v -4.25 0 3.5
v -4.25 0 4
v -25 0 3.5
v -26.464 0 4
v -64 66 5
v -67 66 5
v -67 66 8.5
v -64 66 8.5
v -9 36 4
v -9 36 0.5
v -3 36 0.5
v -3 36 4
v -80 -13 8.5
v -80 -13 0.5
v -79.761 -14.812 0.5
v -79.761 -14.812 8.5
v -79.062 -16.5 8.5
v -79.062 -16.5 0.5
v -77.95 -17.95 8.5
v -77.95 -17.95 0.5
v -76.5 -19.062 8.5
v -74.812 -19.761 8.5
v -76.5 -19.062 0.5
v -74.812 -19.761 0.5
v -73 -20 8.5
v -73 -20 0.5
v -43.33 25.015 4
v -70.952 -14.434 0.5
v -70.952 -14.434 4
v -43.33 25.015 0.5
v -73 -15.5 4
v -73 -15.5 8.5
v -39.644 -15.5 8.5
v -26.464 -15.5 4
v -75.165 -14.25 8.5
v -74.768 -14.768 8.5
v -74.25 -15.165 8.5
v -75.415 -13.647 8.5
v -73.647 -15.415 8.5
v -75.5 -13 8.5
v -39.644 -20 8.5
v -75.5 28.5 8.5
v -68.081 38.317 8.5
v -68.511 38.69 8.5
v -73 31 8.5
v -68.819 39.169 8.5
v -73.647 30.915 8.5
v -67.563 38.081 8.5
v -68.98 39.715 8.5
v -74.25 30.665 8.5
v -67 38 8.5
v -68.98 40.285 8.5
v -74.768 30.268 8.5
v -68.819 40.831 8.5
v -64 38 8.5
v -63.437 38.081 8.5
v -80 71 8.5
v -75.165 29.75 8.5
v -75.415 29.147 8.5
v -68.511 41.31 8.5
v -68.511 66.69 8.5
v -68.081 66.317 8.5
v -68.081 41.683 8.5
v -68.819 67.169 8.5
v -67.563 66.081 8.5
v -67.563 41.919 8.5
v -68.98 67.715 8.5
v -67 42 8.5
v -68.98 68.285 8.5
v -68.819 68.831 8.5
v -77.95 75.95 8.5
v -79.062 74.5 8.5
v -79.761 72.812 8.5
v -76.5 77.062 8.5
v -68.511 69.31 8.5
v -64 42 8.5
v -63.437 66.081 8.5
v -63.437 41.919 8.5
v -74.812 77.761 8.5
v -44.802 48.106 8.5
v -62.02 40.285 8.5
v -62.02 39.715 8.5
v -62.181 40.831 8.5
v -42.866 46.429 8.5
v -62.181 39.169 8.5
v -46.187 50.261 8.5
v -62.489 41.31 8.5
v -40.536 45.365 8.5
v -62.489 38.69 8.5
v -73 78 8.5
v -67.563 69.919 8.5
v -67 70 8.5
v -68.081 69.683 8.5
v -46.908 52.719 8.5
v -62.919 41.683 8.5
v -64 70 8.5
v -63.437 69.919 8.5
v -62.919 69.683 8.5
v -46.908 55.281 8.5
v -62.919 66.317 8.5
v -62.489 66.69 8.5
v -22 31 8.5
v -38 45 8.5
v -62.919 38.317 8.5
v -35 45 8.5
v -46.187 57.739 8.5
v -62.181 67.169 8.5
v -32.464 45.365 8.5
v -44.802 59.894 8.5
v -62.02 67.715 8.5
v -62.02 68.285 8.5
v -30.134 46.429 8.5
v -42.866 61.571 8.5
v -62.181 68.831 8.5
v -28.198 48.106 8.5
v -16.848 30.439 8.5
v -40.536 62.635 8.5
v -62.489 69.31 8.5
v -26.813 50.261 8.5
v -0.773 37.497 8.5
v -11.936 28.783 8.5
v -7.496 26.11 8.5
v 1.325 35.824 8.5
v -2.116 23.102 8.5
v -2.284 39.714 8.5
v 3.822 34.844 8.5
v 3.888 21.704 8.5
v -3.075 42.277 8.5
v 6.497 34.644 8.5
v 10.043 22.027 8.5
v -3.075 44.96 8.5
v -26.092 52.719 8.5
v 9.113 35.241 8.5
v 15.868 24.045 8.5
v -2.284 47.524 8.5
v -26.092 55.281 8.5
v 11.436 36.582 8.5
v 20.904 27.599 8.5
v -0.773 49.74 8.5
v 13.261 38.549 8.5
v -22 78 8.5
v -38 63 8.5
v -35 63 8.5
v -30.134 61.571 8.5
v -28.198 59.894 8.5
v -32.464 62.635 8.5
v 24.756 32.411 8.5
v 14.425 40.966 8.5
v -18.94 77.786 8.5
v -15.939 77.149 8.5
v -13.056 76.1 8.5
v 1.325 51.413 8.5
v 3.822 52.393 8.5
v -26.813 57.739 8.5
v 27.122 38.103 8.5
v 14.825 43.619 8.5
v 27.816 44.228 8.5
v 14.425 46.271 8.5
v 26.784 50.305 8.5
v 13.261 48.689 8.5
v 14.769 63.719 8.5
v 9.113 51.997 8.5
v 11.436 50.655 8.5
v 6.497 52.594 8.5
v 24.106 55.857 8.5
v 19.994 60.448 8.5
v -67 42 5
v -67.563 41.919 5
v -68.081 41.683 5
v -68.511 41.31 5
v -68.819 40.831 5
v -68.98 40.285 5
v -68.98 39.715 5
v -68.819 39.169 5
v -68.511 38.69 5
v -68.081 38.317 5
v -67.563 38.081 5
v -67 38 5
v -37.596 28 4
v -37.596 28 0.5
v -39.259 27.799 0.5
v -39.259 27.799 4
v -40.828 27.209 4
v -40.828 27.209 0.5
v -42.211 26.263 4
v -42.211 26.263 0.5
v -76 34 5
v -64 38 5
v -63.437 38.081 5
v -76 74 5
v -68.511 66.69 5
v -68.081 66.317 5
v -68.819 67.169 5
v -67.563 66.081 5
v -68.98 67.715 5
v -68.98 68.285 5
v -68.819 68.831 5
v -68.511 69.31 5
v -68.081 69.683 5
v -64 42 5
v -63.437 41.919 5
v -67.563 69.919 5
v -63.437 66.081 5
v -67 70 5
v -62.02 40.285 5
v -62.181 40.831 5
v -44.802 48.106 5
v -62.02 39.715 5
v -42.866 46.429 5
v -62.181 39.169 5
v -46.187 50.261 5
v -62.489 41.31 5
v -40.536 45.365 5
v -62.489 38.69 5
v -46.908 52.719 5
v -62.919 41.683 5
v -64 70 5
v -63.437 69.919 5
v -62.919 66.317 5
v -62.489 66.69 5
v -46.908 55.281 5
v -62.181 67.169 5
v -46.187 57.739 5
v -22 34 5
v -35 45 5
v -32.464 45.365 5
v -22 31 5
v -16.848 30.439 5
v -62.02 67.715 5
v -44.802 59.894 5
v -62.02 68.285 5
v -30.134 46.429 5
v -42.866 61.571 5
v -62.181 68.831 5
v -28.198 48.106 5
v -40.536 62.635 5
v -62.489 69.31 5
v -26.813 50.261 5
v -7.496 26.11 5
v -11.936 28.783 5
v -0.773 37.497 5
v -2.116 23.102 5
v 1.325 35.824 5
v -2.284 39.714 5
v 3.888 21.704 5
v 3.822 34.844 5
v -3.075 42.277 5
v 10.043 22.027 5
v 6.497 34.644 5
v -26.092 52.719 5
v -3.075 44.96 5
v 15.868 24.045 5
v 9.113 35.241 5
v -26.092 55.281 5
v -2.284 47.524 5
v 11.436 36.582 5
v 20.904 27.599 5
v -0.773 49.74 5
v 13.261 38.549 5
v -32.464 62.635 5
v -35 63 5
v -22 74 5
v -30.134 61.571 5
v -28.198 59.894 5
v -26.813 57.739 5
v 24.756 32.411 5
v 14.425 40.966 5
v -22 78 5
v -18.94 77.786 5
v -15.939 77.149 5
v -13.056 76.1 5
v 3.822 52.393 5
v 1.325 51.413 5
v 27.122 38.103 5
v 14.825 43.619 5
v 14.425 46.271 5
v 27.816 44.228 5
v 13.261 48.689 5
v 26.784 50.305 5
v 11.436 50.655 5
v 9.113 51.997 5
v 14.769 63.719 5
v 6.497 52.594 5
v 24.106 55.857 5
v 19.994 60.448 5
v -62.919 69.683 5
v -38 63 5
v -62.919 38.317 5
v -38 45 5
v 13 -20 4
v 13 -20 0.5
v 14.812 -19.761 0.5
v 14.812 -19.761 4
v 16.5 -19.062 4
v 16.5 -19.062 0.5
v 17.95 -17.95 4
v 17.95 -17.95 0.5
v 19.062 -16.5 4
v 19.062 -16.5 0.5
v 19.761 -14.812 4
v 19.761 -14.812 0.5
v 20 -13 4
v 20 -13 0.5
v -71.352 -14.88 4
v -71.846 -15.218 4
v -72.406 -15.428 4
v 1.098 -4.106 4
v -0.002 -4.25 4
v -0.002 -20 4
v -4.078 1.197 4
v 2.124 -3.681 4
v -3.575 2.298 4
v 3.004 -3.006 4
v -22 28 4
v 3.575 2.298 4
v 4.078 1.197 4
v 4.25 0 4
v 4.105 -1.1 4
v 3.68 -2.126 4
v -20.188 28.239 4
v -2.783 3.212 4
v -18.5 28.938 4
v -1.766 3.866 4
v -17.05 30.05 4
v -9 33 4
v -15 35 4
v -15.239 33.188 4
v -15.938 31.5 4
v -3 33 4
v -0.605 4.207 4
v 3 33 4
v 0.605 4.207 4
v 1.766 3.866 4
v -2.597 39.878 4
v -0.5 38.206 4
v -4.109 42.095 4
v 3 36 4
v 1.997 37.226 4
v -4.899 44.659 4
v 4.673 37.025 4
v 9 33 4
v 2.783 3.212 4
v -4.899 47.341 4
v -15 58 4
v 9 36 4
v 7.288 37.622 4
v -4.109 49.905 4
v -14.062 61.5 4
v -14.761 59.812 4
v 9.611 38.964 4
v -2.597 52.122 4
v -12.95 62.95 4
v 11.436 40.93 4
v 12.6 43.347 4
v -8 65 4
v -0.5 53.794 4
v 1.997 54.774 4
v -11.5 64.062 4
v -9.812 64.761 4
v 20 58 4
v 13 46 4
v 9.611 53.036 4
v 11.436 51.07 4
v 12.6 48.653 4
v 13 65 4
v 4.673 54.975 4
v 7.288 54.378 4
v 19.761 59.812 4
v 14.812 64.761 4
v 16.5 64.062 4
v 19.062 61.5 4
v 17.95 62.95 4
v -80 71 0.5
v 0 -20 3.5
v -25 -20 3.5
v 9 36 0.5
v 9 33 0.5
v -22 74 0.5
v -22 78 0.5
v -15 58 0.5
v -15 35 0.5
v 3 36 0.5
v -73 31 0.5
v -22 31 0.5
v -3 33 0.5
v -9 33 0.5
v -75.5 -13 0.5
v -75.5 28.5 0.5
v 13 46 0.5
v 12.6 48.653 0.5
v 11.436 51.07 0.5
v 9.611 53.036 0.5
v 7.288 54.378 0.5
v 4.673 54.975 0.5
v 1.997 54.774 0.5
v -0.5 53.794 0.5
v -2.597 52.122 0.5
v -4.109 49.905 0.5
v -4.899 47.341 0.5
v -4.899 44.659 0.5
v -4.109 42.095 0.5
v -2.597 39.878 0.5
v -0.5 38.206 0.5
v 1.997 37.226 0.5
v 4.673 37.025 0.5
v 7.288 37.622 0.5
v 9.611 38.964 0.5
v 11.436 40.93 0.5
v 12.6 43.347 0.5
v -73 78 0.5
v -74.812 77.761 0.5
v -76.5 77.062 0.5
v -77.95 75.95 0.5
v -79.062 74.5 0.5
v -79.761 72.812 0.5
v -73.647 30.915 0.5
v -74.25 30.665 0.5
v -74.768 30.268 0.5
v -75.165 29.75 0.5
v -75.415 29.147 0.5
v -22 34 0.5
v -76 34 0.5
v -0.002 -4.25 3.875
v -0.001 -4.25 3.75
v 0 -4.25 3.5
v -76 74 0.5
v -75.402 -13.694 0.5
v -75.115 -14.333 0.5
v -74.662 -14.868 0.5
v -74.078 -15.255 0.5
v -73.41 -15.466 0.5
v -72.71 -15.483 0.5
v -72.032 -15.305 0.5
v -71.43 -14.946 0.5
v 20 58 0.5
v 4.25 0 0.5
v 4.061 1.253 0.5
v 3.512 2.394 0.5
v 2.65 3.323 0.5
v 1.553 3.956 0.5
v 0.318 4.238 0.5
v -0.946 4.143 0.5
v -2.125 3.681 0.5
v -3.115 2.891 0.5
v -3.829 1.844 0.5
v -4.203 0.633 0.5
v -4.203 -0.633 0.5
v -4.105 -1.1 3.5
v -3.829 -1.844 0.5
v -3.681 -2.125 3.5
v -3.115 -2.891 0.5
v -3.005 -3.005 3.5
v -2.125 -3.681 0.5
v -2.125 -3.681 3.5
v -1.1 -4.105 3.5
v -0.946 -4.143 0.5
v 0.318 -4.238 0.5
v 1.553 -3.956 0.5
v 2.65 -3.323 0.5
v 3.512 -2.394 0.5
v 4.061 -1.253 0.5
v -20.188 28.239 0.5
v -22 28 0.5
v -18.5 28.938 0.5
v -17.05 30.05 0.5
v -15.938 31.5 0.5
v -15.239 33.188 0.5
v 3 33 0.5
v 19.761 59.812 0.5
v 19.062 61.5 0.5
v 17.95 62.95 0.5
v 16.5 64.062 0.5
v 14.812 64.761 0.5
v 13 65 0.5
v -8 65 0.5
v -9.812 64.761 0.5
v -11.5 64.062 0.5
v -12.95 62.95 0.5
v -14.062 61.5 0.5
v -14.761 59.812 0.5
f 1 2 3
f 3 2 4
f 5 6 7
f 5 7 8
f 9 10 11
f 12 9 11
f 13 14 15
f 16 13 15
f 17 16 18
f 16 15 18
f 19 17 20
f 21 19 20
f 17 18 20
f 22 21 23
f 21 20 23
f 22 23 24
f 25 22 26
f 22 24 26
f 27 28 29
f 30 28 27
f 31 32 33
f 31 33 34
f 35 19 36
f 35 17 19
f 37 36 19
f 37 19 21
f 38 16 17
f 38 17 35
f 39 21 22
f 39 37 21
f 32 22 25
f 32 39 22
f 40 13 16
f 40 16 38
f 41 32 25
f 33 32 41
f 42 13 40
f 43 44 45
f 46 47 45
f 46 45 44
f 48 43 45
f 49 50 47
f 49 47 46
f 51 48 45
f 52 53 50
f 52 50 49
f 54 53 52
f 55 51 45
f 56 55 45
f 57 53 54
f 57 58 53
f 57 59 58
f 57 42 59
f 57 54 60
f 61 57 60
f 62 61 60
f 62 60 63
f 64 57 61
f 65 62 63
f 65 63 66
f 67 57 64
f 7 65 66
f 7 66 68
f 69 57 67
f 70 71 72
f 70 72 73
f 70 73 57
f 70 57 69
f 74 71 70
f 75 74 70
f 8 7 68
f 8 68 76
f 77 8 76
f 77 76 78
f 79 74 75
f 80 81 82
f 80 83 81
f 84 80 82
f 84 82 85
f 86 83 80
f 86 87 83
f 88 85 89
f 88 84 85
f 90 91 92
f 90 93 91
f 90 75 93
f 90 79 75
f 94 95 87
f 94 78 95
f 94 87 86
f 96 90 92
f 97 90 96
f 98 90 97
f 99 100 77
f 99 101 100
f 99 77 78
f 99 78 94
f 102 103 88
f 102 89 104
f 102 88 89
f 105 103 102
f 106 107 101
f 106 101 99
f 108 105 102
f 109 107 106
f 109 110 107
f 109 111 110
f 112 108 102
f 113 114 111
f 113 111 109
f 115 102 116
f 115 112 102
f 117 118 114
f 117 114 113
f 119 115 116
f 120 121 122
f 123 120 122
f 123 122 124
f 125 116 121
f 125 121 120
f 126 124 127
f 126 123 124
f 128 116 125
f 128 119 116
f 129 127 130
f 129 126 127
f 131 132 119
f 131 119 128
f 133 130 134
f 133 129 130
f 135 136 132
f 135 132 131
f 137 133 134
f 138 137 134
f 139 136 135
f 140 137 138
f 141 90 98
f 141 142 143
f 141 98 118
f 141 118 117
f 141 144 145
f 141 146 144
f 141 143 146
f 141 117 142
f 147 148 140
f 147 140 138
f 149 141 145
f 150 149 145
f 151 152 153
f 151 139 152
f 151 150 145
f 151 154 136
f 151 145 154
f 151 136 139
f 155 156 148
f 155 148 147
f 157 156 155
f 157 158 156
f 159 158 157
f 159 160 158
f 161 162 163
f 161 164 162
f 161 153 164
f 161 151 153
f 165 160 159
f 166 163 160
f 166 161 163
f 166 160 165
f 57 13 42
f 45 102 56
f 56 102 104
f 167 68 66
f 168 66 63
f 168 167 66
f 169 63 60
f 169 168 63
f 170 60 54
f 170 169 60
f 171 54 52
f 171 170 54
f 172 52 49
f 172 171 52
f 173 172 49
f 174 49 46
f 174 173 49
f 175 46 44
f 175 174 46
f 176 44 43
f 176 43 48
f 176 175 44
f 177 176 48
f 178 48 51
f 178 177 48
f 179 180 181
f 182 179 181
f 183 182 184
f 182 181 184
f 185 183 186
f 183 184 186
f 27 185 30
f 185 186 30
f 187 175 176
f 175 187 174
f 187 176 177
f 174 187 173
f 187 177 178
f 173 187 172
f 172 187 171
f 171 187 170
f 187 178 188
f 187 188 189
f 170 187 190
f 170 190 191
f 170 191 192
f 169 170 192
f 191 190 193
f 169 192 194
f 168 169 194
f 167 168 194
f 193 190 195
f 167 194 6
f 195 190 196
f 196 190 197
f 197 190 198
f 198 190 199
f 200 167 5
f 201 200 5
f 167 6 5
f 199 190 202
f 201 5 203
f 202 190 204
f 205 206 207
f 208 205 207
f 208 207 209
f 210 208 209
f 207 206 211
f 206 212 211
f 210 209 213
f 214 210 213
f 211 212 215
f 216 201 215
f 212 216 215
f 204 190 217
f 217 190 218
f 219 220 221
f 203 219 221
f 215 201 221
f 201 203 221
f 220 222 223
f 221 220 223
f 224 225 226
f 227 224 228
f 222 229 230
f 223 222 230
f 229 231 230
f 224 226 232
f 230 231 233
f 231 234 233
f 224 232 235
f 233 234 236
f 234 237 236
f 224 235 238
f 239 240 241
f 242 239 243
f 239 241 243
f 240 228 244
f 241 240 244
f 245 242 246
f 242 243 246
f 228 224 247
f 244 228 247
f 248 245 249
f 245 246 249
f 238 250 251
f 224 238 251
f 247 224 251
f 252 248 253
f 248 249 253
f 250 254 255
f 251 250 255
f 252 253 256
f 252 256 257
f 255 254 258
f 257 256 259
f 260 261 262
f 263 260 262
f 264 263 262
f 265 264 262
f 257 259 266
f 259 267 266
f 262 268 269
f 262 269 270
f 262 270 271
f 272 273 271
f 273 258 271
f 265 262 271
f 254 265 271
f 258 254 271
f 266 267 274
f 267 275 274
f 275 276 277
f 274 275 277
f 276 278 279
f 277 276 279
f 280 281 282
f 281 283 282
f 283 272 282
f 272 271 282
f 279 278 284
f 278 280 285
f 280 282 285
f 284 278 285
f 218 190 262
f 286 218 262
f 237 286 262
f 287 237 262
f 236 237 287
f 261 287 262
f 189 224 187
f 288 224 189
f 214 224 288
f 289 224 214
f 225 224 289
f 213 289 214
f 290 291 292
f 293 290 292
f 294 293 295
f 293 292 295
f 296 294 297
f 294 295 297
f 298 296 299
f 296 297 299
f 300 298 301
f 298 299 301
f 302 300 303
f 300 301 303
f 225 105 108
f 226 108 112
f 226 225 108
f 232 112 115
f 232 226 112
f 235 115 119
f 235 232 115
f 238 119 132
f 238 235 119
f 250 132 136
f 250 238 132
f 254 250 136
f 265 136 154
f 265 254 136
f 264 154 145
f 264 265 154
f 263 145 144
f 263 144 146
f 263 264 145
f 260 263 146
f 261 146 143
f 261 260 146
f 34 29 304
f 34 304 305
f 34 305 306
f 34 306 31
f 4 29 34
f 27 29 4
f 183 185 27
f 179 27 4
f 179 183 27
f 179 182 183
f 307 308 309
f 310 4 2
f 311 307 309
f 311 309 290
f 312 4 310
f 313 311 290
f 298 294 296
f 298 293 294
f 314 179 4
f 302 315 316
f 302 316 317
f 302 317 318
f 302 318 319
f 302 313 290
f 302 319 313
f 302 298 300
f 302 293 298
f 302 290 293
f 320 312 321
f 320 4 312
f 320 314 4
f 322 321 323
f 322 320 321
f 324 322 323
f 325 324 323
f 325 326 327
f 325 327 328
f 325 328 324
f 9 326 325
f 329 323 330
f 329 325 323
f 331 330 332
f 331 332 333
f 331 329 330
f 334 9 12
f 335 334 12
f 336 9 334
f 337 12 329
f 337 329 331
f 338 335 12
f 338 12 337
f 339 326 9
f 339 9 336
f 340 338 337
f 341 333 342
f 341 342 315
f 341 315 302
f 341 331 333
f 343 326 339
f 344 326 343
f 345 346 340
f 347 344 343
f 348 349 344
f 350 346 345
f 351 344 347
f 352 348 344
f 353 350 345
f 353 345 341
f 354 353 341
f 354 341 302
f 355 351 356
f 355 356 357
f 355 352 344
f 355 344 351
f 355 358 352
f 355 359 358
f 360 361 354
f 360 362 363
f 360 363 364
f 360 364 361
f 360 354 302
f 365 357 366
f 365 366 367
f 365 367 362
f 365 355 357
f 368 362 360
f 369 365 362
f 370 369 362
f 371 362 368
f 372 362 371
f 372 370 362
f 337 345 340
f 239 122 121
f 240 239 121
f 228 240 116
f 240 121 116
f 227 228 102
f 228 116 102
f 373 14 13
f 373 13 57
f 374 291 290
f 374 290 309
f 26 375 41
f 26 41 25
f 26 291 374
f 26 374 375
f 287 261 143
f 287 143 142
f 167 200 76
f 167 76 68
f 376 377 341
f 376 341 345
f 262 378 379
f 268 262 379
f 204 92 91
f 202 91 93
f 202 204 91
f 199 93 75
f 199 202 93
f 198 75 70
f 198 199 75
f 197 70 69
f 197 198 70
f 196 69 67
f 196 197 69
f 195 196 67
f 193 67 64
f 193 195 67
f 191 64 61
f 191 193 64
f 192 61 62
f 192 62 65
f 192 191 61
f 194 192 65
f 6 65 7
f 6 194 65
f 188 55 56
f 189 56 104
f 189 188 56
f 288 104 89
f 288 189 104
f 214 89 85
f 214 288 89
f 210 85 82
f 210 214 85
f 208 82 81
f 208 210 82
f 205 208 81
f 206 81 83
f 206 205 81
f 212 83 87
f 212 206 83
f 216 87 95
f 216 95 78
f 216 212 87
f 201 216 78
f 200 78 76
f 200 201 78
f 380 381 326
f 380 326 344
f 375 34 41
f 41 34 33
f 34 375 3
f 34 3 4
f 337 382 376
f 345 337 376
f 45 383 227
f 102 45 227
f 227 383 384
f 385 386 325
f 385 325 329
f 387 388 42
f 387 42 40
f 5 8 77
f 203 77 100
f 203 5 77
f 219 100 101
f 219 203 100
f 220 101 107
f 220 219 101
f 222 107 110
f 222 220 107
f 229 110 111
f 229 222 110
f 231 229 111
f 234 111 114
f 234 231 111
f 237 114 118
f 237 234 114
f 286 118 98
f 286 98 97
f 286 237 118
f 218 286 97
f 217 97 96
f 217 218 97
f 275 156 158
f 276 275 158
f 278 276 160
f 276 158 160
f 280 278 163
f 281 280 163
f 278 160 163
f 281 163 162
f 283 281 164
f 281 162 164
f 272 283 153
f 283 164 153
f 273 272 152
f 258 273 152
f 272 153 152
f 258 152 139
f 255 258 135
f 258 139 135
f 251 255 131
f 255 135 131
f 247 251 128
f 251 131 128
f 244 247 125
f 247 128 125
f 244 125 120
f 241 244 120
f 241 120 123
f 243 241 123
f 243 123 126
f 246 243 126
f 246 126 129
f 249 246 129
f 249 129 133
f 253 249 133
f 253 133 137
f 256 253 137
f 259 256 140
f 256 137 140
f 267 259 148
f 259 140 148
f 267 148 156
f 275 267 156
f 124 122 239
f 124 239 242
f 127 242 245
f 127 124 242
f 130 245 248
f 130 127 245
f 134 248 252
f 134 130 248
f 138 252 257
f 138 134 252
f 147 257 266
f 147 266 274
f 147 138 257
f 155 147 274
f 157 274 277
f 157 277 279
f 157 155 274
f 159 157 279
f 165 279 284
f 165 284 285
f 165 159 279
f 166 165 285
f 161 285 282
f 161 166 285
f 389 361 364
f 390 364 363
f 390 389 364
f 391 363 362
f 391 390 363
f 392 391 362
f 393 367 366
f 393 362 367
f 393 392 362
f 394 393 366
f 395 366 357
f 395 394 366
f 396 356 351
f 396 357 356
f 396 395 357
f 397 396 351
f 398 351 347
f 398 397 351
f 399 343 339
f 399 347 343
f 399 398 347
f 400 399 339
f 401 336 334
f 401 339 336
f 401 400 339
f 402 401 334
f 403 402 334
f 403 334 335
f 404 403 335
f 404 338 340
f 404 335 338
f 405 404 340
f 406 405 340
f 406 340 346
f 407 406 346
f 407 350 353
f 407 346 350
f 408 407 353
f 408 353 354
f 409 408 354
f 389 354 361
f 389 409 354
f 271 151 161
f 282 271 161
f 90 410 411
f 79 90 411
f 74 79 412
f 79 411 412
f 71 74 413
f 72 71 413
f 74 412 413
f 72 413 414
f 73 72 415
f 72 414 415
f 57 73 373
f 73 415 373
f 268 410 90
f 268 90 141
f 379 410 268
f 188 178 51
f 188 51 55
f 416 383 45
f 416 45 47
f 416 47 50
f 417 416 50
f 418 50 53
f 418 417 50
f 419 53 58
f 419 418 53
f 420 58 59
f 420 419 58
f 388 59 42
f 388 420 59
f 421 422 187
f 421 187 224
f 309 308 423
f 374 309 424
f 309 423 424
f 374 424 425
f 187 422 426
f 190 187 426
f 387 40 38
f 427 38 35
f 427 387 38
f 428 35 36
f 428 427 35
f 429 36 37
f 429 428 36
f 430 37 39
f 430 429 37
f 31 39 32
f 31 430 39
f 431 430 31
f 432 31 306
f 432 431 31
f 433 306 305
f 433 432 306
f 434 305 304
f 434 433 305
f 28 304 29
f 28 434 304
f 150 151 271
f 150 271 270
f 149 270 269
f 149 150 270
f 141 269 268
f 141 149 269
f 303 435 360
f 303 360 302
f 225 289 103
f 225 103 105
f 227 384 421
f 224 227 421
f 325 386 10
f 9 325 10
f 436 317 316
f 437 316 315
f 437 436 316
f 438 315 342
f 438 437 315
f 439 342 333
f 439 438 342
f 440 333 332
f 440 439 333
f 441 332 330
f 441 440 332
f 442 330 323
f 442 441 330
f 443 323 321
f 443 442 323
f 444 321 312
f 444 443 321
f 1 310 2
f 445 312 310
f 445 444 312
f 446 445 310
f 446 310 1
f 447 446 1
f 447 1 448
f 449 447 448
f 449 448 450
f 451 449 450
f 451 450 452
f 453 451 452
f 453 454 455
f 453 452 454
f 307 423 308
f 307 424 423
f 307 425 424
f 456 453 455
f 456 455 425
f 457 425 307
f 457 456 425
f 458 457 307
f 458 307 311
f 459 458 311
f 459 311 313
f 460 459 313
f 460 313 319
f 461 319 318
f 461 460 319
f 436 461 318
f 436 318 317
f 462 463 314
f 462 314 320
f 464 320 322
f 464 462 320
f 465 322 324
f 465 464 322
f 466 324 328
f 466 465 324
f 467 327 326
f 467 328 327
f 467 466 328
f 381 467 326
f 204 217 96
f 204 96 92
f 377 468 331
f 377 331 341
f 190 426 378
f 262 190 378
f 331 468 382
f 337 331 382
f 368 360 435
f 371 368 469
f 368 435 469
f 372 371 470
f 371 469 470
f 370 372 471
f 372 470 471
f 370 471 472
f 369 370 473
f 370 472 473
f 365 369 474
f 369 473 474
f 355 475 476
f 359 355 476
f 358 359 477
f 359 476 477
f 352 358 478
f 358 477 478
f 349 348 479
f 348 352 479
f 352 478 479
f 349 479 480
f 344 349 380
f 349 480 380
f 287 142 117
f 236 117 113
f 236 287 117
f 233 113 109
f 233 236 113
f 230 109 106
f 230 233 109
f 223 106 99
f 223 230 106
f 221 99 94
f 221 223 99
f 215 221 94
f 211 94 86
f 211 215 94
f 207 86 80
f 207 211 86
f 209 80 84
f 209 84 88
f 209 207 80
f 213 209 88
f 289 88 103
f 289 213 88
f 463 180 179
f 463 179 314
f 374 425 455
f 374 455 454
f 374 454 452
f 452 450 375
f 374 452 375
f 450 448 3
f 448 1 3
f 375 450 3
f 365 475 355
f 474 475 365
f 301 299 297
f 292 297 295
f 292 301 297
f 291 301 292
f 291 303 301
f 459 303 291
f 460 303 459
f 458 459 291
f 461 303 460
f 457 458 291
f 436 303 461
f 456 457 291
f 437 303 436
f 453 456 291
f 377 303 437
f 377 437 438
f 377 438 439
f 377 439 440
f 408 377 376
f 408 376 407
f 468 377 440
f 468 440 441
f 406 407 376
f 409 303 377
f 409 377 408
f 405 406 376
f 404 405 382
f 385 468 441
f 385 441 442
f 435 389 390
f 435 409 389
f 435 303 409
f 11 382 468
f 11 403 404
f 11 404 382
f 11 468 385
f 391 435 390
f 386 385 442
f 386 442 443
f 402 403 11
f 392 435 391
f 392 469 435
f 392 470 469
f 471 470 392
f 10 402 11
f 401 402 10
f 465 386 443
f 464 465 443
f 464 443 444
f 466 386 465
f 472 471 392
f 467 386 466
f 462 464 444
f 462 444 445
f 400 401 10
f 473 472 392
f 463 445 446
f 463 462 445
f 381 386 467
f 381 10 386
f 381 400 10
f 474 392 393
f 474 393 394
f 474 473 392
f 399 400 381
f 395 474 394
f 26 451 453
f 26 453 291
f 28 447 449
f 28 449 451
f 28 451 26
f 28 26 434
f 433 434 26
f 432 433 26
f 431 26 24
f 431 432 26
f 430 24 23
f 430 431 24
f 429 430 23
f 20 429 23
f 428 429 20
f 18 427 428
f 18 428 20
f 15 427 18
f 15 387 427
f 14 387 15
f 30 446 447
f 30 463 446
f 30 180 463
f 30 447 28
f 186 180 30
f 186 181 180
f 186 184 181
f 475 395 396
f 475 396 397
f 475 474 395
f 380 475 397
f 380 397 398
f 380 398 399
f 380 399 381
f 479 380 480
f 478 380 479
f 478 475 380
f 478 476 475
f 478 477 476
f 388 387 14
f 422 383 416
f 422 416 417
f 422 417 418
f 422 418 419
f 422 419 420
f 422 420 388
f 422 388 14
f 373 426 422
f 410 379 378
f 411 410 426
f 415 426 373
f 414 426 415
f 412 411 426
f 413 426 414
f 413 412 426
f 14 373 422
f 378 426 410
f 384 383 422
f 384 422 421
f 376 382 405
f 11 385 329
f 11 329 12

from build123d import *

# Parameters (mm, degrees)
SKETCH018_R     = 4.25
SKETCH018_R_2   = 9
SKETCH018_W     = 6
SKETCH018_H     = 3
PAD011_DEPTH    = 8
SKETCH020_W     = 56.576859
SKETCH020_H     = 40
POCKET007_DEPTH = 4.5
POCKET008_DEPTH = 4.5
SKETCH021_R     = 9
PAD012_DEPTH    = 3.5
POCKET009_DEPTH = 20.001


with BuildPart() as part:
    # Sketch018 → Pad011 (new body)
    with BuildSketch(Plane.XY):
        with BuildLine():
            Line((20, 58), (20, -13))
            ThreePointArc((13, -20), (17.949747, -17.949747), (20, -13))
            Line((13, -20), (-73, -20))
            ThreePointArc((-80, -13), (-77.949747, -17.949747), (-73, -20))
            Line((-80, -13), (-80, 71))
            ThreePointArc((-73, 78), (-77.949747, 75.949747), (-80, 71))
            Line((-73, 78), (-22, 78))
            Line((-22, 31), (-22, 78))
            Line((-73, 31), (-22, 31))
            ThreePointArc((-73, 31), (-74.767767, 30.267767), (-75.5, 28.5))
            Line((-75.5, 28.5), (-75.5, -13))
            ThreePointArc((-75.5, -13), (-73.751764, -15.384292), (-70.95212, -14.433941))
            Line((-70.95212, -14.433941), (-43.329649, 25.015035))
            ThreePointArc((-37.595585, 28), (-40.827825, 27.209076), (-43.329649, 25.015035))
            Line((-37.595585, 28), (-22, 28))
            ThreePointArc((-22, 28), (-17.050253, 30.050253), (-15, 35))
            Line((-15, 35), (-15, 58))
            ThreePointArc((-8, 65), (-12.949747, 62.949747), (-15, 58))
            Line((-8, 65), (13, 65))
            ThreePointArc((20, 58), (17.949747, 62.949747), (13, 65))
        make_face()
        Circle(SKETCH018_R, mode=Mode.SUBTRACT)
        with Locations((4, 46)):
            Circle(SKETCH018_R_2, mode=Mode.SUBTRACT)
        with BuildLine():
            ThreePointArc((-38, 63), (-47, 54), (-38, 45))
            Line((-38, 45), (-35, 45))
            ThreePointArc((-35, 45), (-26, 54), (-35, 63))
            Line((-35, 63), (-38, 63))
        make_face(mode=Mode.SUBTRACT)
        with BuildLine():
            ThreePointArc((-67, 70), (-69, 68), (-67, 66))
            Line((-67, 66), (-64, 66))
            ThreePointArc((-64, 66), (-62, 68), (-64, 70))
            Line((-64, 70), (-67, 70))
        make_face(mode=Mode.SUBTRACT)
        with BuildLine():
            ThreePointArc((-67, 42), (-69, 40), (-67, 38))
            Line((-67, 38), (-64, 38))
            ThreePointArc((-64, 38), (-62, 40), (-64, 42))
            Line((-64, 42), (-67, 42))
        make_face(mode=Mode.SUBTRACT)
        with Locations((6, 34.5)):
            Rectangle(SKETCH018_W, SKETCH018_H, mode=Mode.SUBTRACT)
        with Locations((-6, 34.5)):
            Rectangle(SKETCH018_W, SKETCH018_H, mode=Mode.SUBTRACT)
    extrude(amount=PAD011_DEPTH)

    # Sketch020 → Pocket007 (cut)
    with BuildSketch(Plane.XY):
        with Locations((-47.711571, 54)):
            Rectangle(SKETCH020_W, SKETCH020_H)
    extrude(amount=POCKET007_DEPTH, mode=Mode.SUBTRACT)

    # Sketch019 (on Face5 of Pocket007) → Pocket008 (cut)
    with BuildSketch(Plane.XY.offset(8)):
        Polygon((-73, -15.5), (-25.471525, -15.5), (-25.471525, -22.26432), (22.647079, -22.26432), (22.647079, 72.273804), (-17.92174, 72.273804), (-17.92174, 30.299976), (-42.694947, 30.299976), (-73, -13), align=None)
    extrude(amount=-POCKET008_DEPTH, mode=Mode.SUBTRACT)

    # Sketch021 (on Face38 of Pocket008) → Pad012 (join)
    with BuildSketch(Plane.XY.offset(8)):
        with BuildLine():
            ThreePointArc((-7.496085, 26.109881), (24.755897, 32.411198), (14.768623, 63.718565))
            Line((-13.056022, 76.099882), (14.768623, 63.718565))
            ThreePointArc((-13.056022, 76.099882), (-17.428206, 77.519728), (-22, 78))
            Line((-22, 78), (-22, 31))
            ThreePointArc((-7.496085, 26.109881), (-14.346948, 29.744572), (-22, 31))
        make_face()
        with Locations((5.824645, 43.618683)):
            Circle(SKETCH021_R, mode=Mode.SUBTRACT)
    extrude(amount=-PAD012_DEPTH)

    # Sketch022 → Pocket009 (cut, through all)
    with BuildSketch(Plane.XZ):
        Polygon((0, 3), (-25, 3), (-40.931572, 8.439757), (-40.931572, 13.093841), (-0.040726, 13.093841), align=None)
    extrude(amount=POCKET009_DEPTH, mode=Mode.SUBTRACT)


with BuildPart() as part_1:
    # Body008 placement: moved
    add(part.part.moved(Location((0, 0, 0.5))))


solid = part_1.part
